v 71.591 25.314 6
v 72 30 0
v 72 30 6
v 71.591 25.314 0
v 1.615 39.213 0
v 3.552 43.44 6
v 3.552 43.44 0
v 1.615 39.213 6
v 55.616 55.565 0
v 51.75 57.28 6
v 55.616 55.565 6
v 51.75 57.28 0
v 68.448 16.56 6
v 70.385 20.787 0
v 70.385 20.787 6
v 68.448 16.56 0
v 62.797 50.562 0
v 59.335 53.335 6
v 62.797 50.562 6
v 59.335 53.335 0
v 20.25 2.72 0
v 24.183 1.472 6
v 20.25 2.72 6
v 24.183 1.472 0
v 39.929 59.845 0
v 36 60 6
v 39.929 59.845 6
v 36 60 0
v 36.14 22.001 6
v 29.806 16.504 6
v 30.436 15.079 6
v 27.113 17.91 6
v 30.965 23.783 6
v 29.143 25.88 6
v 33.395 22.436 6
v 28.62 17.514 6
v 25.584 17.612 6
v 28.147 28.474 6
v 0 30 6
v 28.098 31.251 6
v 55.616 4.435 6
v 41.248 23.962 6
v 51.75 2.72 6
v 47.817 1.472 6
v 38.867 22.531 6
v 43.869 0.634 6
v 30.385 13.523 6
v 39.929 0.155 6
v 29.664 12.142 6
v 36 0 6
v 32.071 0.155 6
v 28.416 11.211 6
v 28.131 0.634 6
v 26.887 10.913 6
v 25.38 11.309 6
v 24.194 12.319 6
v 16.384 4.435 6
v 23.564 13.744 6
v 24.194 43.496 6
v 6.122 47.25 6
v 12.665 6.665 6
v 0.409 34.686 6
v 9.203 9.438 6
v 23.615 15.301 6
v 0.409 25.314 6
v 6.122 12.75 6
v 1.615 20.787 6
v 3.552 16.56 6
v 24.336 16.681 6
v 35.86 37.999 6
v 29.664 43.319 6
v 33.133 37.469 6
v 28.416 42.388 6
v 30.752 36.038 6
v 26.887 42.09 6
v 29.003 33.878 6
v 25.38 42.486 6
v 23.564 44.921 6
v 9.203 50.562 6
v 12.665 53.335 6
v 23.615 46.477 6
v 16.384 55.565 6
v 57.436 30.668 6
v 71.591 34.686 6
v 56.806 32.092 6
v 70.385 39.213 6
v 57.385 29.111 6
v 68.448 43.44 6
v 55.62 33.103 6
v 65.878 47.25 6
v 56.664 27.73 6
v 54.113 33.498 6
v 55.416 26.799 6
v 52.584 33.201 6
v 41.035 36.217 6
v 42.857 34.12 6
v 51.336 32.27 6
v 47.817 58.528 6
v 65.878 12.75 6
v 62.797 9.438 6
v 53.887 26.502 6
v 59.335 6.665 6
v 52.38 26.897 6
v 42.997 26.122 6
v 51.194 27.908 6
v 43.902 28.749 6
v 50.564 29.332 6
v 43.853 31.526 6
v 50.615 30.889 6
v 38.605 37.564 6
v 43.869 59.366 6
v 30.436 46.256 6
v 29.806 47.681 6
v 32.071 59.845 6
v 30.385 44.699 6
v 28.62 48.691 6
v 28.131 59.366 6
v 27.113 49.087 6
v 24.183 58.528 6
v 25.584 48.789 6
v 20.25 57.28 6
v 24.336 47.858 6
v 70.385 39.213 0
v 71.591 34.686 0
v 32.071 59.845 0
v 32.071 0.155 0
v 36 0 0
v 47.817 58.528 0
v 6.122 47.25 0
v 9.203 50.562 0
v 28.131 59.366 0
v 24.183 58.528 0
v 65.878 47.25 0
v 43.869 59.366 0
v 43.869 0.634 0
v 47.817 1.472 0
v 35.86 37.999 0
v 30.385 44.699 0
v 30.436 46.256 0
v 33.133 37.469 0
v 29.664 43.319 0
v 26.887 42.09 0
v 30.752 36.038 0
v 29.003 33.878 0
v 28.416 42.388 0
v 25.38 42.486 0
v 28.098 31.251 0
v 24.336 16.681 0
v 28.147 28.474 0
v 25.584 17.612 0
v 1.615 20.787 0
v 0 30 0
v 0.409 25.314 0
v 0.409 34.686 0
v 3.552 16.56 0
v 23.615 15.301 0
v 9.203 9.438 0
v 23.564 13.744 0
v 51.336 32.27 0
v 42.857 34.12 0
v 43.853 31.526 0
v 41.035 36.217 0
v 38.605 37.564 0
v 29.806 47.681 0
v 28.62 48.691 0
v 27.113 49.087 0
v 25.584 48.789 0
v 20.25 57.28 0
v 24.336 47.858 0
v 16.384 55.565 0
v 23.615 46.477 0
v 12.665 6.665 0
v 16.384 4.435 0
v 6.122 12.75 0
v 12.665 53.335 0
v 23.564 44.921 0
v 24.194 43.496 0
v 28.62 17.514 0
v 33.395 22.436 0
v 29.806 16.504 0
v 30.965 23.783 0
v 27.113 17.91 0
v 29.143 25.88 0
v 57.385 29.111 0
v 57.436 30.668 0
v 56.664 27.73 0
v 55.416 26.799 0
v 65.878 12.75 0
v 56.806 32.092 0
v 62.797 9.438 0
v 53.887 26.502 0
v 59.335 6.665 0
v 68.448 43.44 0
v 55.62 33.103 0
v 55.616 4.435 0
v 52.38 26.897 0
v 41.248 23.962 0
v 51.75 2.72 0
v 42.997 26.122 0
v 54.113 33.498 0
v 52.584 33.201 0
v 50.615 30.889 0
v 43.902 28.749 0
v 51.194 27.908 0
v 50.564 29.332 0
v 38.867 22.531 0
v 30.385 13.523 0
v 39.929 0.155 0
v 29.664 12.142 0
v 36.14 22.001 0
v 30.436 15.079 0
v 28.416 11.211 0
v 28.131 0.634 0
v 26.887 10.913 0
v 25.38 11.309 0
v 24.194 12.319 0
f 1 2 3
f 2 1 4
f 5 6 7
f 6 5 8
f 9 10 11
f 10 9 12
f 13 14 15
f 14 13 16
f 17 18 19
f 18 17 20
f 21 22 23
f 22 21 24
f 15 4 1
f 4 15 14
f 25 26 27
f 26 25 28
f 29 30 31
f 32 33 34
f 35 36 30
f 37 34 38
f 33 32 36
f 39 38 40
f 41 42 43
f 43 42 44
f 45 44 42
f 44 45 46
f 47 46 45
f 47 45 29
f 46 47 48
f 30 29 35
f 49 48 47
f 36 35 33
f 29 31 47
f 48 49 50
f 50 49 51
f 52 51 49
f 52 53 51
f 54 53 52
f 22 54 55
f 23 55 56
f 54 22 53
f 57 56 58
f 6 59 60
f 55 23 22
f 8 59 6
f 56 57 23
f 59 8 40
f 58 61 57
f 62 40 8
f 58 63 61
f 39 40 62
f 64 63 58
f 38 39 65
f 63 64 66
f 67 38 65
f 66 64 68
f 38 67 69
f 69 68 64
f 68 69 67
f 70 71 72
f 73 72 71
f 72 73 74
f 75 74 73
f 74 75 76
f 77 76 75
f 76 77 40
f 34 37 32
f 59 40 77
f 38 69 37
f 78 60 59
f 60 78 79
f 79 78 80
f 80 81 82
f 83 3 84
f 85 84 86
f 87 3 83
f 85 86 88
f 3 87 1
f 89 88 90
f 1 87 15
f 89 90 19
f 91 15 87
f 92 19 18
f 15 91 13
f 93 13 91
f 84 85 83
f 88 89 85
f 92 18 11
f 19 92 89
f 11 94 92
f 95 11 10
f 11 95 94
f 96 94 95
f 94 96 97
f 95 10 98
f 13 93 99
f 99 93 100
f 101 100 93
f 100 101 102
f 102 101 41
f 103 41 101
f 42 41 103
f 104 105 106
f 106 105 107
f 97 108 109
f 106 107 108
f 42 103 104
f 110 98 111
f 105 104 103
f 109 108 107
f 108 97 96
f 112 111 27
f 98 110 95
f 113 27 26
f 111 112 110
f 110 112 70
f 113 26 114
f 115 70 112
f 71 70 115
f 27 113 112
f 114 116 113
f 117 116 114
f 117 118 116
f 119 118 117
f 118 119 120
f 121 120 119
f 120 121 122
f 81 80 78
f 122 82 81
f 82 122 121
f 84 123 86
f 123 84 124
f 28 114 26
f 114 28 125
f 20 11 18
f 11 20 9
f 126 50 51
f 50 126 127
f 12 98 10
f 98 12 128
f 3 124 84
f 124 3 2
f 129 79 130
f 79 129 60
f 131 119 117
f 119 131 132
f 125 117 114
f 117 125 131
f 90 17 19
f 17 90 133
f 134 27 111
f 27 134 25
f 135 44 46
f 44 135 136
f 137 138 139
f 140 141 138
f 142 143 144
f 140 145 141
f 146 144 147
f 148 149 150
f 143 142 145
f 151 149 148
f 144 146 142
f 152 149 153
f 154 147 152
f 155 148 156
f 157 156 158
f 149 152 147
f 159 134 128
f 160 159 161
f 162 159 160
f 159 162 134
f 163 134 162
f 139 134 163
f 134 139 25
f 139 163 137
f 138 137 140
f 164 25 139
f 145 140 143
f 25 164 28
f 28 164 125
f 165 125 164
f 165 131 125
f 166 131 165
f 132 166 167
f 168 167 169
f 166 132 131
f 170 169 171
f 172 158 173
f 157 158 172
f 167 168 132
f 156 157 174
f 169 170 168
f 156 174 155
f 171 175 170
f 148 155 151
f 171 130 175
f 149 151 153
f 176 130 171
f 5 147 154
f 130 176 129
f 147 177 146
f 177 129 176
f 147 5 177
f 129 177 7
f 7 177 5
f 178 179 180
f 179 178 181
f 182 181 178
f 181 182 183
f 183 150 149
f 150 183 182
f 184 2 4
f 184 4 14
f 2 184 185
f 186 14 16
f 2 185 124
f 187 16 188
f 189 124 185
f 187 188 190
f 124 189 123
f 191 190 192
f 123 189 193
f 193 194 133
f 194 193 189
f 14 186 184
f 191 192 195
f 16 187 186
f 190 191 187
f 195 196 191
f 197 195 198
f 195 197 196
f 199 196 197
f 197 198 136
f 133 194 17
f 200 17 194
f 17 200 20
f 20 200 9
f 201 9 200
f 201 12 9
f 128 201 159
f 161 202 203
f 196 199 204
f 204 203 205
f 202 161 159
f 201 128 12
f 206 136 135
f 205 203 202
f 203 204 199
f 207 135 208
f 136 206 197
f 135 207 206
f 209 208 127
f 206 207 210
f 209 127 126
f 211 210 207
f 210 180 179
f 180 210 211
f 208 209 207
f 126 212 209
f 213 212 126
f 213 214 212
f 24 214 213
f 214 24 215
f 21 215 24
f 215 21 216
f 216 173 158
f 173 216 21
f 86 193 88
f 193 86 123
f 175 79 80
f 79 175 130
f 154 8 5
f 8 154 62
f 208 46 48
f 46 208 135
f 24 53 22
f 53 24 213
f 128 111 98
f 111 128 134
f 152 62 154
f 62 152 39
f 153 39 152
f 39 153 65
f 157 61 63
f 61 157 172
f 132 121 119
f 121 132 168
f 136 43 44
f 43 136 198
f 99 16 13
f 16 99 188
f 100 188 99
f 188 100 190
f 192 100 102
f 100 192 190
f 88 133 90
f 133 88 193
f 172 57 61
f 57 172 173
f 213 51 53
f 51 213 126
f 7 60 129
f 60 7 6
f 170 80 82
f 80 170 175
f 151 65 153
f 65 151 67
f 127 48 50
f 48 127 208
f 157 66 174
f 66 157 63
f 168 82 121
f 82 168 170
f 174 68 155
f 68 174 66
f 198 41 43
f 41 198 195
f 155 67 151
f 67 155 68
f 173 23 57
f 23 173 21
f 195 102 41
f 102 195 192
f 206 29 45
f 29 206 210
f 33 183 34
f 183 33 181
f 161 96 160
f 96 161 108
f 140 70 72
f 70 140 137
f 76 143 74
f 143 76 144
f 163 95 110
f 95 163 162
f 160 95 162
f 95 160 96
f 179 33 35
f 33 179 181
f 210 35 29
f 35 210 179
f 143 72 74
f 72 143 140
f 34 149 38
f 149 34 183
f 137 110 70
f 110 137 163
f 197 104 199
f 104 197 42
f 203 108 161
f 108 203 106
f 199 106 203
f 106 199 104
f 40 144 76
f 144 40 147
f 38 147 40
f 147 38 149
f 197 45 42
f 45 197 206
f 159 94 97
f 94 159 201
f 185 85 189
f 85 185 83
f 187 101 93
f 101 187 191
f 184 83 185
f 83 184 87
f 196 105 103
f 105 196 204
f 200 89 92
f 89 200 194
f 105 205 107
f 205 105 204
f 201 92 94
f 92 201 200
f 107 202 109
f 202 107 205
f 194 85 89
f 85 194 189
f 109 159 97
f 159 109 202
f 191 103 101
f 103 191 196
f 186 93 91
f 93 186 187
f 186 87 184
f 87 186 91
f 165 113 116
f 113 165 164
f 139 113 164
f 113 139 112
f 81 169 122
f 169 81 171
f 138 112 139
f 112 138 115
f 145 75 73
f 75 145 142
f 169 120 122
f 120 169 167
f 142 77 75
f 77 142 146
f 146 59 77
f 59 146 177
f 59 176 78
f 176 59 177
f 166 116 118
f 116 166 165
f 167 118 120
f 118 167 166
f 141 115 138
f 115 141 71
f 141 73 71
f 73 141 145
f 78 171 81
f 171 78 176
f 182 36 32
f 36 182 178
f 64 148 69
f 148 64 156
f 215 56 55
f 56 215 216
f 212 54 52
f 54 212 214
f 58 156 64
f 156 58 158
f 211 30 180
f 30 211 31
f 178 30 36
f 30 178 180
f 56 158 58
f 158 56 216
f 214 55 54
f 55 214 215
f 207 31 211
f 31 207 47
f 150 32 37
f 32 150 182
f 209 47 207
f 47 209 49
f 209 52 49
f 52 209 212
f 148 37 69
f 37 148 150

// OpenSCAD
$fn = 32;

// ----------------------------------------------------------------------
// Cam plate: double_lobe cam, base R28
// ----------------------------------------------------------------------

// --- parameters (mm) ---
base_r = 28;              // base circle radius
lobe_h = 8;               // cam lobe rise
bore_r = 8;               // shaft bore radius
plate_t = 6;              // plate thickness, Z (extrusion height)
ring_r = 18;              // lightening ring radius
bolt_r = 3.5;             // lightening hole radius

profile = [[72, 30], [71.591, 34.686], [70.385, 39.213], [68.448, 43.44], [65.878, 47.25], [62.797, 50.562], [59.335, 53.335], [55.616, 55.565], [51.75, 57.28], [47.817, 58.528], [43.869, 59.366], [39.929, 59.845], [36, 60], [32.071, 59.845], [28.131, 59.366], [24.183, 58.528], [20.25, 57.28], [16.384, 55.565], [12.665, 53.335], [9.203, 50.562], [6.122, 47.25], [3.552, 43.44], [1.615, 39.213], [0.409, 34.686], [0, 30], [0.409, 25.314], [1.615, 20.787], [3.552, 16.56], [6.122, 12.75], [9.203, 9.438], [12.665, 6.665], [16.384, 4.435], [20.25, 2.72], [24.183, 1.472], [28.131, 0.634], [32.071, 0.155], [36, 0], [39.929, 0.155], [43.869, 0.634], [47.817, 1.472], [51.75, 2.72], [55.616, 4.435], [59.335, 6.665], [62.797, 9.438], [65.878, 12.75], [68.448, 16.56], [70.385, 20.787], [71.591, 25.314]];  // primary outline, 48 points, counter clockwise
void_1 = [[43.853, 31.526], [42.857, 34.12], [41.035, 36.217], [38.605, 37.564], [35.86, 37.999], [33.133, 37.469], [30.752, 36.038], [29.003, 33.878], [28.098, 31.251], [28.147, 28.474], [29.143, 25.88], [30.965, 23.783], [33.395, 22.436], [36.14, 22.001], [38.867, 22.531], [41.248, 23.962], [42.997, 26.122], [43.902, 28.749]];  // shaft bore, 18 points
void_2 = [[57.436, 30.668], [56.806, 32.092], [55.62, 33.103], [54.113, 33.498], [52.584, 33.201], [51.336, 32.27], [50.615, 30.889], [50.564, 29.332], [51.194, 27.908], [52.38, 26.897], [53.887, 26.502], [55.416, 26.799], [56.664, 27.73], [57.385, 29.111]];  // lightening hole 1, 14 points
void_3 = [[30.436, 46.256], [29.806, 47.681], [28.62, 48.691], [27.113, 49.087], [25.584, 48.789], [24.336, 47.858], [23.615, 46.477], [23.564, 44.921], [24.194, 43.496], [25.38, 42.486], [26.887, 42.09], [28.416, 42.388], [29.664, 43.319], [30.385, 44.699]];  // lightening hole 2, 14 points
void_4 = [[30.436, 15.079], [29.806, 16.504], [28.62, 17.514], [27.113, 17.91], [25.584, 17.612], [24.336, 16.681], [23.615, 15.301], [23.564, 13.744], [24.194, 12.319], [25.38, 11.309], [26.887, 10.913], [28.416, 11.211], [29.664, 12.142], [30.385, 13.523]];  // lightening hole 3, 14 points

// --- the one profile operation ---
difference() {
  linear_extrude(height = plate_t) polygon(points = profile);
  translate([0, 0, -1])
    linear_extrude(height = plate_t + 2) polygon(points = void_1);
  translate([0, 0, -1])
    linear_extrude(height = plate_t + 2) polygon(points = void_2);
  translate([0, 0, -1])
    linear_extrude(height = plate_t + 2) polygon(points = void_3);
  translate([0, 0, -1])
    linear_extrude(height = plate_t + 2) polygon(points = void_4);
}
